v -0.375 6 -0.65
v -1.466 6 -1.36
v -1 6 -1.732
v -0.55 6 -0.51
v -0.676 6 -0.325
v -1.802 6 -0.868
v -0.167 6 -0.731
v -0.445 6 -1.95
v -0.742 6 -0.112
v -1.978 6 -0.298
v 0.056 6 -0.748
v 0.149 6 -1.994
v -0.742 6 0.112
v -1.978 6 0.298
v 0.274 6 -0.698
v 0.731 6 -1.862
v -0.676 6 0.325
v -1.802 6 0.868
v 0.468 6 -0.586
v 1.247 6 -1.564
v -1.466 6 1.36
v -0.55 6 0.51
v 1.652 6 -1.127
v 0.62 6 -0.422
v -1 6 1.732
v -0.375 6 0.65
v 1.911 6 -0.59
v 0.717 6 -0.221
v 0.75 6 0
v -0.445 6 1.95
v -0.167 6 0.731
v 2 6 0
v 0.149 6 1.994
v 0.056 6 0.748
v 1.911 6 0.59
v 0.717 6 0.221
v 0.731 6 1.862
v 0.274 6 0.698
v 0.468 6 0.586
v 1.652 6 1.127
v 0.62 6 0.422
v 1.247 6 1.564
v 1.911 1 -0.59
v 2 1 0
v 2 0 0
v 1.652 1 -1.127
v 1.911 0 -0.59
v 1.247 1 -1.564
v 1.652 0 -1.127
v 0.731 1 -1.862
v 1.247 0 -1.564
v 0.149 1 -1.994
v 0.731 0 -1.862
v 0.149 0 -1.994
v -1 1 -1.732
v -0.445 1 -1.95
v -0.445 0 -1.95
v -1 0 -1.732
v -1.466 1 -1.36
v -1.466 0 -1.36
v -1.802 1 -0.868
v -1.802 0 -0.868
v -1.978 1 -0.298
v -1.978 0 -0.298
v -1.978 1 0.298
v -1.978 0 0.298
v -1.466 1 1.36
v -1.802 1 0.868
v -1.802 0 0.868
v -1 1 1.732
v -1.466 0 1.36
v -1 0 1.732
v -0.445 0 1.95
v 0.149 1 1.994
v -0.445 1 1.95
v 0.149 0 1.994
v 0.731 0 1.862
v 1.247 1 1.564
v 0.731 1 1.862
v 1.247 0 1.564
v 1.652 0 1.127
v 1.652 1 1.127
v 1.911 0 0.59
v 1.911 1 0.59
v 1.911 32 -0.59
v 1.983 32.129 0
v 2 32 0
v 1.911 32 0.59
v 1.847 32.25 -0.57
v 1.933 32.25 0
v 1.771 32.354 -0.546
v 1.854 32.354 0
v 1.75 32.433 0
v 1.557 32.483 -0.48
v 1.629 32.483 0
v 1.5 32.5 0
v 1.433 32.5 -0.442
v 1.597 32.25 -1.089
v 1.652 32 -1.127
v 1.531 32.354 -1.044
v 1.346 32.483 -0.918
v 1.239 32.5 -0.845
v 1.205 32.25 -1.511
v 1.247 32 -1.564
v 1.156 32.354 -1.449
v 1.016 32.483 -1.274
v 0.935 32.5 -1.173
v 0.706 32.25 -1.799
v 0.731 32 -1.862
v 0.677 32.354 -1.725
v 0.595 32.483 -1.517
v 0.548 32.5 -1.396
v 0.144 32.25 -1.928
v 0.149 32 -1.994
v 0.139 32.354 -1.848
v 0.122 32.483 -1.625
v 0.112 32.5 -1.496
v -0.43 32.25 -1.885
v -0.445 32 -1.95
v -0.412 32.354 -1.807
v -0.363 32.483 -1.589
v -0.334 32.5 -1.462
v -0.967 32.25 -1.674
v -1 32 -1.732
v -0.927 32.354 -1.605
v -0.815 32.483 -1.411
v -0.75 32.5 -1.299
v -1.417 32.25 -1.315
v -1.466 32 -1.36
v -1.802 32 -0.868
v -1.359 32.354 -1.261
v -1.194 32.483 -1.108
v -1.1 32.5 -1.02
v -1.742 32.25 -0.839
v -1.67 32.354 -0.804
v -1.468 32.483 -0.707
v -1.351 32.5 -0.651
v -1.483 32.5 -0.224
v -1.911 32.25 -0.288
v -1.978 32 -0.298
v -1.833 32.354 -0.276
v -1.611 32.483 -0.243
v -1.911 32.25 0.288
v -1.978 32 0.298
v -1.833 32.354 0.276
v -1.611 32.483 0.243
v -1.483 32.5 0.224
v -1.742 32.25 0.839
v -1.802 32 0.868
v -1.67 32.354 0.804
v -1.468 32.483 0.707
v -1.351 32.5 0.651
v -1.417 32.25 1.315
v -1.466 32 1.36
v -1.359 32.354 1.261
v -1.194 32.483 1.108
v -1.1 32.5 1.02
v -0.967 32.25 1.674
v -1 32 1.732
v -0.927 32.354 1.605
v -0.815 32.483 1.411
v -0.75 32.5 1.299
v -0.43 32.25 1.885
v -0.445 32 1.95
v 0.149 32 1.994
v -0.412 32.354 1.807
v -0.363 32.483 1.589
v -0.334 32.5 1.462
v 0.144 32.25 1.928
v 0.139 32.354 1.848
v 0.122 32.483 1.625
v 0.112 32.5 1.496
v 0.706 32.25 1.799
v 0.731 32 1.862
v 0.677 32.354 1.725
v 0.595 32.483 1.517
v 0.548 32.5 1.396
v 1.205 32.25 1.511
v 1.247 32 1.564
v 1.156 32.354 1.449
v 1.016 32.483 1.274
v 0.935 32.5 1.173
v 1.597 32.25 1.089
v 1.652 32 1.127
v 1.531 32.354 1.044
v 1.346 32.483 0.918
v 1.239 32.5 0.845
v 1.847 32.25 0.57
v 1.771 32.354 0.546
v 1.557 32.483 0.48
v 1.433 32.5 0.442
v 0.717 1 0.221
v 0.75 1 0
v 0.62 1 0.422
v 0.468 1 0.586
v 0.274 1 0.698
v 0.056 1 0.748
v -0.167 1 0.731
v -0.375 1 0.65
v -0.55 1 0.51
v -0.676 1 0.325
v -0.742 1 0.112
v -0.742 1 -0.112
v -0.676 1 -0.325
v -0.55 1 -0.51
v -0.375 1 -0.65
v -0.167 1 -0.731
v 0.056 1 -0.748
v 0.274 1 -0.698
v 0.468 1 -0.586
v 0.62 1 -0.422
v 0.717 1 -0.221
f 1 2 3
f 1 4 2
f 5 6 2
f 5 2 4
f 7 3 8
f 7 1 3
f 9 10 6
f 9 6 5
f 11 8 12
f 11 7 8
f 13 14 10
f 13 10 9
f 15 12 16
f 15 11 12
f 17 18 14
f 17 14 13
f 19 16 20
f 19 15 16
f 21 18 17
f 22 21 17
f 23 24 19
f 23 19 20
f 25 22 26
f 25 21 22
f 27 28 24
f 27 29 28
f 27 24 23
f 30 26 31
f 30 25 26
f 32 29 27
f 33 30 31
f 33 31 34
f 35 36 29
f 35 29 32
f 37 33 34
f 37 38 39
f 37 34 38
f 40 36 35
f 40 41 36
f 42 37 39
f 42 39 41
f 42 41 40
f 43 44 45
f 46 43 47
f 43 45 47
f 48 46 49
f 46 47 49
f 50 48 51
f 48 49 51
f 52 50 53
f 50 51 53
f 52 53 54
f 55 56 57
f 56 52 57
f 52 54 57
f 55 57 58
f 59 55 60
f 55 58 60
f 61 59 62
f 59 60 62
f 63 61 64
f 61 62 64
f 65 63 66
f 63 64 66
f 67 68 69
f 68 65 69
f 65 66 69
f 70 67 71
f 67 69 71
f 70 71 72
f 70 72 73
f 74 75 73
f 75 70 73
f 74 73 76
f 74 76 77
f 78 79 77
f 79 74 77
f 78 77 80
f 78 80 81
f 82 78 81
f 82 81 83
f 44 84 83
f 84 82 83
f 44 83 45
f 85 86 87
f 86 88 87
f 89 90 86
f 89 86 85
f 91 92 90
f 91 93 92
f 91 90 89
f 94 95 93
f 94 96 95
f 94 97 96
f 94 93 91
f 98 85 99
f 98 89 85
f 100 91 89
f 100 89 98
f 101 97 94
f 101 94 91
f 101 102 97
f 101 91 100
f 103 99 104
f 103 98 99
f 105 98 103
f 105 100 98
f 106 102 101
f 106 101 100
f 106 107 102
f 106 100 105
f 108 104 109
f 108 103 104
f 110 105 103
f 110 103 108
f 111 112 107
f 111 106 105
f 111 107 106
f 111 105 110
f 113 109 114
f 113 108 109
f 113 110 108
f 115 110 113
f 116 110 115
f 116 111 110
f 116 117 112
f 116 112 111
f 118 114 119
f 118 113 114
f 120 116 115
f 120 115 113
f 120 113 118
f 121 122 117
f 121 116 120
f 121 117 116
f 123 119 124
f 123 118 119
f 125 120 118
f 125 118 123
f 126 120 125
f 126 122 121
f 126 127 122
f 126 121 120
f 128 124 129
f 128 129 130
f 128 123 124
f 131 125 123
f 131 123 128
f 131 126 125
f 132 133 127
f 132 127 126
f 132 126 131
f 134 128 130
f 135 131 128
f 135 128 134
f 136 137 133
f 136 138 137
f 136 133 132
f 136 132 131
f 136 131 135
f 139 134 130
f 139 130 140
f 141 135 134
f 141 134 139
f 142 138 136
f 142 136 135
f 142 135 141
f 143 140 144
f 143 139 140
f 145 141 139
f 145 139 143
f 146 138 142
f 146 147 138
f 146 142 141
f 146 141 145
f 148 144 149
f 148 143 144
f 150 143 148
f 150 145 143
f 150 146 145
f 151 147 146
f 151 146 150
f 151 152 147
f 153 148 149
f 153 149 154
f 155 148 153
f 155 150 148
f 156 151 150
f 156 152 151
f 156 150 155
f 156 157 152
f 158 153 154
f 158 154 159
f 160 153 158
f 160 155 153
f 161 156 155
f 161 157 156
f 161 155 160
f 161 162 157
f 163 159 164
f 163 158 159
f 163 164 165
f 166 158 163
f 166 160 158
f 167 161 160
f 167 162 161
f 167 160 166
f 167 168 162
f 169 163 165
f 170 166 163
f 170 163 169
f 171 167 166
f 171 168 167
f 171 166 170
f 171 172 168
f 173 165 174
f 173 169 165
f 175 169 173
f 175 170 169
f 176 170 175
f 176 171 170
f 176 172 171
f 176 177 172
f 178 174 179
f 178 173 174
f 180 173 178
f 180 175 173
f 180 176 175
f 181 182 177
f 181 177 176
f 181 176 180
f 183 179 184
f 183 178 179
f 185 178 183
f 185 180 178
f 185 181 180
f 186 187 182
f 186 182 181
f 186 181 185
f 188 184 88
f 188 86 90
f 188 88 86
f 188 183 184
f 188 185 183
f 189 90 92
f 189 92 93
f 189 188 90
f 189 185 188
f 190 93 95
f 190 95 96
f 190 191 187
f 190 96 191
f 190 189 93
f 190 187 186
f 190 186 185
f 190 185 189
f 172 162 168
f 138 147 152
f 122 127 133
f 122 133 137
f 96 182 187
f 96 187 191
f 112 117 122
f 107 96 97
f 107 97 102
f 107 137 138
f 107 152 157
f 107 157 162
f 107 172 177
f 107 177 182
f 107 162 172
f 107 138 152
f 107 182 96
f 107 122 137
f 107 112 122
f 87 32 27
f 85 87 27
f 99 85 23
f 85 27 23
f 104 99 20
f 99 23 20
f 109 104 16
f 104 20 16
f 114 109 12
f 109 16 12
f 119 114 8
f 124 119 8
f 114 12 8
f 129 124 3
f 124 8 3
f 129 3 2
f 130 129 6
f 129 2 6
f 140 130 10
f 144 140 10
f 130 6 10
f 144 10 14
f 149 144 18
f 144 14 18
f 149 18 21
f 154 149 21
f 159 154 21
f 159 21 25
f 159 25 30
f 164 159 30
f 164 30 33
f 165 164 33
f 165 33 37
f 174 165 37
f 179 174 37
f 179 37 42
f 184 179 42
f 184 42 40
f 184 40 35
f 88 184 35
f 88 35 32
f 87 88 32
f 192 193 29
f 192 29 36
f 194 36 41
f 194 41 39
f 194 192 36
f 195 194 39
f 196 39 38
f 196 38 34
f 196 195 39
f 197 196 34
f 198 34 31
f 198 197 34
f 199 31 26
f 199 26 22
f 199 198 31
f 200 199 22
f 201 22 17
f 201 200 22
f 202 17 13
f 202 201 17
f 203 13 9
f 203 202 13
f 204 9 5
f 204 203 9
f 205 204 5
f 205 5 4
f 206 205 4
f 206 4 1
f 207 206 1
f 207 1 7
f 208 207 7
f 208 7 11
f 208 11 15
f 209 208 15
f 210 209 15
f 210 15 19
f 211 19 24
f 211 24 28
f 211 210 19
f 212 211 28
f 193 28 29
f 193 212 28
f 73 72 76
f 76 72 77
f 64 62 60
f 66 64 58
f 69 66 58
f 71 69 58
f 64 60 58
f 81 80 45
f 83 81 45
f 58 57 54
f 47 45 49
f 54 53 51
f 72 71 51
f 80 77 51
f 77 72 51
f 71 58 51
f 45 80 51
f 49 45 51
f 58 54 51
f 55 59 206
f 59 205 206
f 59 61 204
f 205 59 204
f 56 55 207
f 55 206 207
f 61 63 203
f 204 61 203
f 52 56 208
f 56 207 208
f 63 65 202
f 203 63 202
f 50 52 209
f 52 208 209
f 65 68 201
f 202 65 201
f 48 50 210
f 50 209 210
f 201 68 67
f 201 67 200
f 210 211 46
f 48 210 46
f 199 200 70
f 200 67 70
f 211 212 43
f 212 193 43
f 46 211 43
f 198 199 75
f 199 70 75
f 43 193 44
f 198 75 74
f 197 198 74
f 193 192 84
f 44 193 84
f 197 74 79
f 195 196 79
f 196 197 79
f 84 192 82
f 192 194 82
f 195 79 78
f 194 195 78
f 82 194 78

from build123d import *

# Parameters (mm, degrees)
SKETCH_1_R          = 2
EXTRUDE_1_DEPTH     = 32.5
CUT_EXTRUDE_START   = -1
SKETCH_2_R          = 2
SKETCH_2_R_2        = 0.75
CUT_EXTRUDE_1_DEPTH = 5
FILLET_1_R          = 0.5


with BuildPart() as part:
    # ｽｹｯﾁ1 → ﾎﾞｽ - 押し出し1 (new body)
    with BuildSketch(Plane(origin=(0, 0, 0), x_dir=(1, 0, 0), z_dir=(0, 1, 0))):
        Circle(SKETCH_1_R)
    extrude(amount=EXTRUDE_1_DEPTH)

    # ｽｹｯﾁ2 → ｶｯﾄ - 押し出し1 (cut)
    with BuildSketch(Plane.XZ.offset(CUT_EXTRUDE_START)):
        Circle(SKETCH_2_R)
        Circle(SKETCH_2_R_2, mode=Mode.SUBTRACT)
    extrude(amount=-CUT_EXTRUDE_1_DEPTH, mode=Mode.SUBTRACT)

    # ﾌｨﾚｯﾄ1
    fillet_1_edges = [part.edges().sort_by_distance(p)[0] for p in [
        (-2, 32.5, 0),
    ]]
    fillet(fillet_1_edges, radius=FILLET_1_R)


solid = part.part
